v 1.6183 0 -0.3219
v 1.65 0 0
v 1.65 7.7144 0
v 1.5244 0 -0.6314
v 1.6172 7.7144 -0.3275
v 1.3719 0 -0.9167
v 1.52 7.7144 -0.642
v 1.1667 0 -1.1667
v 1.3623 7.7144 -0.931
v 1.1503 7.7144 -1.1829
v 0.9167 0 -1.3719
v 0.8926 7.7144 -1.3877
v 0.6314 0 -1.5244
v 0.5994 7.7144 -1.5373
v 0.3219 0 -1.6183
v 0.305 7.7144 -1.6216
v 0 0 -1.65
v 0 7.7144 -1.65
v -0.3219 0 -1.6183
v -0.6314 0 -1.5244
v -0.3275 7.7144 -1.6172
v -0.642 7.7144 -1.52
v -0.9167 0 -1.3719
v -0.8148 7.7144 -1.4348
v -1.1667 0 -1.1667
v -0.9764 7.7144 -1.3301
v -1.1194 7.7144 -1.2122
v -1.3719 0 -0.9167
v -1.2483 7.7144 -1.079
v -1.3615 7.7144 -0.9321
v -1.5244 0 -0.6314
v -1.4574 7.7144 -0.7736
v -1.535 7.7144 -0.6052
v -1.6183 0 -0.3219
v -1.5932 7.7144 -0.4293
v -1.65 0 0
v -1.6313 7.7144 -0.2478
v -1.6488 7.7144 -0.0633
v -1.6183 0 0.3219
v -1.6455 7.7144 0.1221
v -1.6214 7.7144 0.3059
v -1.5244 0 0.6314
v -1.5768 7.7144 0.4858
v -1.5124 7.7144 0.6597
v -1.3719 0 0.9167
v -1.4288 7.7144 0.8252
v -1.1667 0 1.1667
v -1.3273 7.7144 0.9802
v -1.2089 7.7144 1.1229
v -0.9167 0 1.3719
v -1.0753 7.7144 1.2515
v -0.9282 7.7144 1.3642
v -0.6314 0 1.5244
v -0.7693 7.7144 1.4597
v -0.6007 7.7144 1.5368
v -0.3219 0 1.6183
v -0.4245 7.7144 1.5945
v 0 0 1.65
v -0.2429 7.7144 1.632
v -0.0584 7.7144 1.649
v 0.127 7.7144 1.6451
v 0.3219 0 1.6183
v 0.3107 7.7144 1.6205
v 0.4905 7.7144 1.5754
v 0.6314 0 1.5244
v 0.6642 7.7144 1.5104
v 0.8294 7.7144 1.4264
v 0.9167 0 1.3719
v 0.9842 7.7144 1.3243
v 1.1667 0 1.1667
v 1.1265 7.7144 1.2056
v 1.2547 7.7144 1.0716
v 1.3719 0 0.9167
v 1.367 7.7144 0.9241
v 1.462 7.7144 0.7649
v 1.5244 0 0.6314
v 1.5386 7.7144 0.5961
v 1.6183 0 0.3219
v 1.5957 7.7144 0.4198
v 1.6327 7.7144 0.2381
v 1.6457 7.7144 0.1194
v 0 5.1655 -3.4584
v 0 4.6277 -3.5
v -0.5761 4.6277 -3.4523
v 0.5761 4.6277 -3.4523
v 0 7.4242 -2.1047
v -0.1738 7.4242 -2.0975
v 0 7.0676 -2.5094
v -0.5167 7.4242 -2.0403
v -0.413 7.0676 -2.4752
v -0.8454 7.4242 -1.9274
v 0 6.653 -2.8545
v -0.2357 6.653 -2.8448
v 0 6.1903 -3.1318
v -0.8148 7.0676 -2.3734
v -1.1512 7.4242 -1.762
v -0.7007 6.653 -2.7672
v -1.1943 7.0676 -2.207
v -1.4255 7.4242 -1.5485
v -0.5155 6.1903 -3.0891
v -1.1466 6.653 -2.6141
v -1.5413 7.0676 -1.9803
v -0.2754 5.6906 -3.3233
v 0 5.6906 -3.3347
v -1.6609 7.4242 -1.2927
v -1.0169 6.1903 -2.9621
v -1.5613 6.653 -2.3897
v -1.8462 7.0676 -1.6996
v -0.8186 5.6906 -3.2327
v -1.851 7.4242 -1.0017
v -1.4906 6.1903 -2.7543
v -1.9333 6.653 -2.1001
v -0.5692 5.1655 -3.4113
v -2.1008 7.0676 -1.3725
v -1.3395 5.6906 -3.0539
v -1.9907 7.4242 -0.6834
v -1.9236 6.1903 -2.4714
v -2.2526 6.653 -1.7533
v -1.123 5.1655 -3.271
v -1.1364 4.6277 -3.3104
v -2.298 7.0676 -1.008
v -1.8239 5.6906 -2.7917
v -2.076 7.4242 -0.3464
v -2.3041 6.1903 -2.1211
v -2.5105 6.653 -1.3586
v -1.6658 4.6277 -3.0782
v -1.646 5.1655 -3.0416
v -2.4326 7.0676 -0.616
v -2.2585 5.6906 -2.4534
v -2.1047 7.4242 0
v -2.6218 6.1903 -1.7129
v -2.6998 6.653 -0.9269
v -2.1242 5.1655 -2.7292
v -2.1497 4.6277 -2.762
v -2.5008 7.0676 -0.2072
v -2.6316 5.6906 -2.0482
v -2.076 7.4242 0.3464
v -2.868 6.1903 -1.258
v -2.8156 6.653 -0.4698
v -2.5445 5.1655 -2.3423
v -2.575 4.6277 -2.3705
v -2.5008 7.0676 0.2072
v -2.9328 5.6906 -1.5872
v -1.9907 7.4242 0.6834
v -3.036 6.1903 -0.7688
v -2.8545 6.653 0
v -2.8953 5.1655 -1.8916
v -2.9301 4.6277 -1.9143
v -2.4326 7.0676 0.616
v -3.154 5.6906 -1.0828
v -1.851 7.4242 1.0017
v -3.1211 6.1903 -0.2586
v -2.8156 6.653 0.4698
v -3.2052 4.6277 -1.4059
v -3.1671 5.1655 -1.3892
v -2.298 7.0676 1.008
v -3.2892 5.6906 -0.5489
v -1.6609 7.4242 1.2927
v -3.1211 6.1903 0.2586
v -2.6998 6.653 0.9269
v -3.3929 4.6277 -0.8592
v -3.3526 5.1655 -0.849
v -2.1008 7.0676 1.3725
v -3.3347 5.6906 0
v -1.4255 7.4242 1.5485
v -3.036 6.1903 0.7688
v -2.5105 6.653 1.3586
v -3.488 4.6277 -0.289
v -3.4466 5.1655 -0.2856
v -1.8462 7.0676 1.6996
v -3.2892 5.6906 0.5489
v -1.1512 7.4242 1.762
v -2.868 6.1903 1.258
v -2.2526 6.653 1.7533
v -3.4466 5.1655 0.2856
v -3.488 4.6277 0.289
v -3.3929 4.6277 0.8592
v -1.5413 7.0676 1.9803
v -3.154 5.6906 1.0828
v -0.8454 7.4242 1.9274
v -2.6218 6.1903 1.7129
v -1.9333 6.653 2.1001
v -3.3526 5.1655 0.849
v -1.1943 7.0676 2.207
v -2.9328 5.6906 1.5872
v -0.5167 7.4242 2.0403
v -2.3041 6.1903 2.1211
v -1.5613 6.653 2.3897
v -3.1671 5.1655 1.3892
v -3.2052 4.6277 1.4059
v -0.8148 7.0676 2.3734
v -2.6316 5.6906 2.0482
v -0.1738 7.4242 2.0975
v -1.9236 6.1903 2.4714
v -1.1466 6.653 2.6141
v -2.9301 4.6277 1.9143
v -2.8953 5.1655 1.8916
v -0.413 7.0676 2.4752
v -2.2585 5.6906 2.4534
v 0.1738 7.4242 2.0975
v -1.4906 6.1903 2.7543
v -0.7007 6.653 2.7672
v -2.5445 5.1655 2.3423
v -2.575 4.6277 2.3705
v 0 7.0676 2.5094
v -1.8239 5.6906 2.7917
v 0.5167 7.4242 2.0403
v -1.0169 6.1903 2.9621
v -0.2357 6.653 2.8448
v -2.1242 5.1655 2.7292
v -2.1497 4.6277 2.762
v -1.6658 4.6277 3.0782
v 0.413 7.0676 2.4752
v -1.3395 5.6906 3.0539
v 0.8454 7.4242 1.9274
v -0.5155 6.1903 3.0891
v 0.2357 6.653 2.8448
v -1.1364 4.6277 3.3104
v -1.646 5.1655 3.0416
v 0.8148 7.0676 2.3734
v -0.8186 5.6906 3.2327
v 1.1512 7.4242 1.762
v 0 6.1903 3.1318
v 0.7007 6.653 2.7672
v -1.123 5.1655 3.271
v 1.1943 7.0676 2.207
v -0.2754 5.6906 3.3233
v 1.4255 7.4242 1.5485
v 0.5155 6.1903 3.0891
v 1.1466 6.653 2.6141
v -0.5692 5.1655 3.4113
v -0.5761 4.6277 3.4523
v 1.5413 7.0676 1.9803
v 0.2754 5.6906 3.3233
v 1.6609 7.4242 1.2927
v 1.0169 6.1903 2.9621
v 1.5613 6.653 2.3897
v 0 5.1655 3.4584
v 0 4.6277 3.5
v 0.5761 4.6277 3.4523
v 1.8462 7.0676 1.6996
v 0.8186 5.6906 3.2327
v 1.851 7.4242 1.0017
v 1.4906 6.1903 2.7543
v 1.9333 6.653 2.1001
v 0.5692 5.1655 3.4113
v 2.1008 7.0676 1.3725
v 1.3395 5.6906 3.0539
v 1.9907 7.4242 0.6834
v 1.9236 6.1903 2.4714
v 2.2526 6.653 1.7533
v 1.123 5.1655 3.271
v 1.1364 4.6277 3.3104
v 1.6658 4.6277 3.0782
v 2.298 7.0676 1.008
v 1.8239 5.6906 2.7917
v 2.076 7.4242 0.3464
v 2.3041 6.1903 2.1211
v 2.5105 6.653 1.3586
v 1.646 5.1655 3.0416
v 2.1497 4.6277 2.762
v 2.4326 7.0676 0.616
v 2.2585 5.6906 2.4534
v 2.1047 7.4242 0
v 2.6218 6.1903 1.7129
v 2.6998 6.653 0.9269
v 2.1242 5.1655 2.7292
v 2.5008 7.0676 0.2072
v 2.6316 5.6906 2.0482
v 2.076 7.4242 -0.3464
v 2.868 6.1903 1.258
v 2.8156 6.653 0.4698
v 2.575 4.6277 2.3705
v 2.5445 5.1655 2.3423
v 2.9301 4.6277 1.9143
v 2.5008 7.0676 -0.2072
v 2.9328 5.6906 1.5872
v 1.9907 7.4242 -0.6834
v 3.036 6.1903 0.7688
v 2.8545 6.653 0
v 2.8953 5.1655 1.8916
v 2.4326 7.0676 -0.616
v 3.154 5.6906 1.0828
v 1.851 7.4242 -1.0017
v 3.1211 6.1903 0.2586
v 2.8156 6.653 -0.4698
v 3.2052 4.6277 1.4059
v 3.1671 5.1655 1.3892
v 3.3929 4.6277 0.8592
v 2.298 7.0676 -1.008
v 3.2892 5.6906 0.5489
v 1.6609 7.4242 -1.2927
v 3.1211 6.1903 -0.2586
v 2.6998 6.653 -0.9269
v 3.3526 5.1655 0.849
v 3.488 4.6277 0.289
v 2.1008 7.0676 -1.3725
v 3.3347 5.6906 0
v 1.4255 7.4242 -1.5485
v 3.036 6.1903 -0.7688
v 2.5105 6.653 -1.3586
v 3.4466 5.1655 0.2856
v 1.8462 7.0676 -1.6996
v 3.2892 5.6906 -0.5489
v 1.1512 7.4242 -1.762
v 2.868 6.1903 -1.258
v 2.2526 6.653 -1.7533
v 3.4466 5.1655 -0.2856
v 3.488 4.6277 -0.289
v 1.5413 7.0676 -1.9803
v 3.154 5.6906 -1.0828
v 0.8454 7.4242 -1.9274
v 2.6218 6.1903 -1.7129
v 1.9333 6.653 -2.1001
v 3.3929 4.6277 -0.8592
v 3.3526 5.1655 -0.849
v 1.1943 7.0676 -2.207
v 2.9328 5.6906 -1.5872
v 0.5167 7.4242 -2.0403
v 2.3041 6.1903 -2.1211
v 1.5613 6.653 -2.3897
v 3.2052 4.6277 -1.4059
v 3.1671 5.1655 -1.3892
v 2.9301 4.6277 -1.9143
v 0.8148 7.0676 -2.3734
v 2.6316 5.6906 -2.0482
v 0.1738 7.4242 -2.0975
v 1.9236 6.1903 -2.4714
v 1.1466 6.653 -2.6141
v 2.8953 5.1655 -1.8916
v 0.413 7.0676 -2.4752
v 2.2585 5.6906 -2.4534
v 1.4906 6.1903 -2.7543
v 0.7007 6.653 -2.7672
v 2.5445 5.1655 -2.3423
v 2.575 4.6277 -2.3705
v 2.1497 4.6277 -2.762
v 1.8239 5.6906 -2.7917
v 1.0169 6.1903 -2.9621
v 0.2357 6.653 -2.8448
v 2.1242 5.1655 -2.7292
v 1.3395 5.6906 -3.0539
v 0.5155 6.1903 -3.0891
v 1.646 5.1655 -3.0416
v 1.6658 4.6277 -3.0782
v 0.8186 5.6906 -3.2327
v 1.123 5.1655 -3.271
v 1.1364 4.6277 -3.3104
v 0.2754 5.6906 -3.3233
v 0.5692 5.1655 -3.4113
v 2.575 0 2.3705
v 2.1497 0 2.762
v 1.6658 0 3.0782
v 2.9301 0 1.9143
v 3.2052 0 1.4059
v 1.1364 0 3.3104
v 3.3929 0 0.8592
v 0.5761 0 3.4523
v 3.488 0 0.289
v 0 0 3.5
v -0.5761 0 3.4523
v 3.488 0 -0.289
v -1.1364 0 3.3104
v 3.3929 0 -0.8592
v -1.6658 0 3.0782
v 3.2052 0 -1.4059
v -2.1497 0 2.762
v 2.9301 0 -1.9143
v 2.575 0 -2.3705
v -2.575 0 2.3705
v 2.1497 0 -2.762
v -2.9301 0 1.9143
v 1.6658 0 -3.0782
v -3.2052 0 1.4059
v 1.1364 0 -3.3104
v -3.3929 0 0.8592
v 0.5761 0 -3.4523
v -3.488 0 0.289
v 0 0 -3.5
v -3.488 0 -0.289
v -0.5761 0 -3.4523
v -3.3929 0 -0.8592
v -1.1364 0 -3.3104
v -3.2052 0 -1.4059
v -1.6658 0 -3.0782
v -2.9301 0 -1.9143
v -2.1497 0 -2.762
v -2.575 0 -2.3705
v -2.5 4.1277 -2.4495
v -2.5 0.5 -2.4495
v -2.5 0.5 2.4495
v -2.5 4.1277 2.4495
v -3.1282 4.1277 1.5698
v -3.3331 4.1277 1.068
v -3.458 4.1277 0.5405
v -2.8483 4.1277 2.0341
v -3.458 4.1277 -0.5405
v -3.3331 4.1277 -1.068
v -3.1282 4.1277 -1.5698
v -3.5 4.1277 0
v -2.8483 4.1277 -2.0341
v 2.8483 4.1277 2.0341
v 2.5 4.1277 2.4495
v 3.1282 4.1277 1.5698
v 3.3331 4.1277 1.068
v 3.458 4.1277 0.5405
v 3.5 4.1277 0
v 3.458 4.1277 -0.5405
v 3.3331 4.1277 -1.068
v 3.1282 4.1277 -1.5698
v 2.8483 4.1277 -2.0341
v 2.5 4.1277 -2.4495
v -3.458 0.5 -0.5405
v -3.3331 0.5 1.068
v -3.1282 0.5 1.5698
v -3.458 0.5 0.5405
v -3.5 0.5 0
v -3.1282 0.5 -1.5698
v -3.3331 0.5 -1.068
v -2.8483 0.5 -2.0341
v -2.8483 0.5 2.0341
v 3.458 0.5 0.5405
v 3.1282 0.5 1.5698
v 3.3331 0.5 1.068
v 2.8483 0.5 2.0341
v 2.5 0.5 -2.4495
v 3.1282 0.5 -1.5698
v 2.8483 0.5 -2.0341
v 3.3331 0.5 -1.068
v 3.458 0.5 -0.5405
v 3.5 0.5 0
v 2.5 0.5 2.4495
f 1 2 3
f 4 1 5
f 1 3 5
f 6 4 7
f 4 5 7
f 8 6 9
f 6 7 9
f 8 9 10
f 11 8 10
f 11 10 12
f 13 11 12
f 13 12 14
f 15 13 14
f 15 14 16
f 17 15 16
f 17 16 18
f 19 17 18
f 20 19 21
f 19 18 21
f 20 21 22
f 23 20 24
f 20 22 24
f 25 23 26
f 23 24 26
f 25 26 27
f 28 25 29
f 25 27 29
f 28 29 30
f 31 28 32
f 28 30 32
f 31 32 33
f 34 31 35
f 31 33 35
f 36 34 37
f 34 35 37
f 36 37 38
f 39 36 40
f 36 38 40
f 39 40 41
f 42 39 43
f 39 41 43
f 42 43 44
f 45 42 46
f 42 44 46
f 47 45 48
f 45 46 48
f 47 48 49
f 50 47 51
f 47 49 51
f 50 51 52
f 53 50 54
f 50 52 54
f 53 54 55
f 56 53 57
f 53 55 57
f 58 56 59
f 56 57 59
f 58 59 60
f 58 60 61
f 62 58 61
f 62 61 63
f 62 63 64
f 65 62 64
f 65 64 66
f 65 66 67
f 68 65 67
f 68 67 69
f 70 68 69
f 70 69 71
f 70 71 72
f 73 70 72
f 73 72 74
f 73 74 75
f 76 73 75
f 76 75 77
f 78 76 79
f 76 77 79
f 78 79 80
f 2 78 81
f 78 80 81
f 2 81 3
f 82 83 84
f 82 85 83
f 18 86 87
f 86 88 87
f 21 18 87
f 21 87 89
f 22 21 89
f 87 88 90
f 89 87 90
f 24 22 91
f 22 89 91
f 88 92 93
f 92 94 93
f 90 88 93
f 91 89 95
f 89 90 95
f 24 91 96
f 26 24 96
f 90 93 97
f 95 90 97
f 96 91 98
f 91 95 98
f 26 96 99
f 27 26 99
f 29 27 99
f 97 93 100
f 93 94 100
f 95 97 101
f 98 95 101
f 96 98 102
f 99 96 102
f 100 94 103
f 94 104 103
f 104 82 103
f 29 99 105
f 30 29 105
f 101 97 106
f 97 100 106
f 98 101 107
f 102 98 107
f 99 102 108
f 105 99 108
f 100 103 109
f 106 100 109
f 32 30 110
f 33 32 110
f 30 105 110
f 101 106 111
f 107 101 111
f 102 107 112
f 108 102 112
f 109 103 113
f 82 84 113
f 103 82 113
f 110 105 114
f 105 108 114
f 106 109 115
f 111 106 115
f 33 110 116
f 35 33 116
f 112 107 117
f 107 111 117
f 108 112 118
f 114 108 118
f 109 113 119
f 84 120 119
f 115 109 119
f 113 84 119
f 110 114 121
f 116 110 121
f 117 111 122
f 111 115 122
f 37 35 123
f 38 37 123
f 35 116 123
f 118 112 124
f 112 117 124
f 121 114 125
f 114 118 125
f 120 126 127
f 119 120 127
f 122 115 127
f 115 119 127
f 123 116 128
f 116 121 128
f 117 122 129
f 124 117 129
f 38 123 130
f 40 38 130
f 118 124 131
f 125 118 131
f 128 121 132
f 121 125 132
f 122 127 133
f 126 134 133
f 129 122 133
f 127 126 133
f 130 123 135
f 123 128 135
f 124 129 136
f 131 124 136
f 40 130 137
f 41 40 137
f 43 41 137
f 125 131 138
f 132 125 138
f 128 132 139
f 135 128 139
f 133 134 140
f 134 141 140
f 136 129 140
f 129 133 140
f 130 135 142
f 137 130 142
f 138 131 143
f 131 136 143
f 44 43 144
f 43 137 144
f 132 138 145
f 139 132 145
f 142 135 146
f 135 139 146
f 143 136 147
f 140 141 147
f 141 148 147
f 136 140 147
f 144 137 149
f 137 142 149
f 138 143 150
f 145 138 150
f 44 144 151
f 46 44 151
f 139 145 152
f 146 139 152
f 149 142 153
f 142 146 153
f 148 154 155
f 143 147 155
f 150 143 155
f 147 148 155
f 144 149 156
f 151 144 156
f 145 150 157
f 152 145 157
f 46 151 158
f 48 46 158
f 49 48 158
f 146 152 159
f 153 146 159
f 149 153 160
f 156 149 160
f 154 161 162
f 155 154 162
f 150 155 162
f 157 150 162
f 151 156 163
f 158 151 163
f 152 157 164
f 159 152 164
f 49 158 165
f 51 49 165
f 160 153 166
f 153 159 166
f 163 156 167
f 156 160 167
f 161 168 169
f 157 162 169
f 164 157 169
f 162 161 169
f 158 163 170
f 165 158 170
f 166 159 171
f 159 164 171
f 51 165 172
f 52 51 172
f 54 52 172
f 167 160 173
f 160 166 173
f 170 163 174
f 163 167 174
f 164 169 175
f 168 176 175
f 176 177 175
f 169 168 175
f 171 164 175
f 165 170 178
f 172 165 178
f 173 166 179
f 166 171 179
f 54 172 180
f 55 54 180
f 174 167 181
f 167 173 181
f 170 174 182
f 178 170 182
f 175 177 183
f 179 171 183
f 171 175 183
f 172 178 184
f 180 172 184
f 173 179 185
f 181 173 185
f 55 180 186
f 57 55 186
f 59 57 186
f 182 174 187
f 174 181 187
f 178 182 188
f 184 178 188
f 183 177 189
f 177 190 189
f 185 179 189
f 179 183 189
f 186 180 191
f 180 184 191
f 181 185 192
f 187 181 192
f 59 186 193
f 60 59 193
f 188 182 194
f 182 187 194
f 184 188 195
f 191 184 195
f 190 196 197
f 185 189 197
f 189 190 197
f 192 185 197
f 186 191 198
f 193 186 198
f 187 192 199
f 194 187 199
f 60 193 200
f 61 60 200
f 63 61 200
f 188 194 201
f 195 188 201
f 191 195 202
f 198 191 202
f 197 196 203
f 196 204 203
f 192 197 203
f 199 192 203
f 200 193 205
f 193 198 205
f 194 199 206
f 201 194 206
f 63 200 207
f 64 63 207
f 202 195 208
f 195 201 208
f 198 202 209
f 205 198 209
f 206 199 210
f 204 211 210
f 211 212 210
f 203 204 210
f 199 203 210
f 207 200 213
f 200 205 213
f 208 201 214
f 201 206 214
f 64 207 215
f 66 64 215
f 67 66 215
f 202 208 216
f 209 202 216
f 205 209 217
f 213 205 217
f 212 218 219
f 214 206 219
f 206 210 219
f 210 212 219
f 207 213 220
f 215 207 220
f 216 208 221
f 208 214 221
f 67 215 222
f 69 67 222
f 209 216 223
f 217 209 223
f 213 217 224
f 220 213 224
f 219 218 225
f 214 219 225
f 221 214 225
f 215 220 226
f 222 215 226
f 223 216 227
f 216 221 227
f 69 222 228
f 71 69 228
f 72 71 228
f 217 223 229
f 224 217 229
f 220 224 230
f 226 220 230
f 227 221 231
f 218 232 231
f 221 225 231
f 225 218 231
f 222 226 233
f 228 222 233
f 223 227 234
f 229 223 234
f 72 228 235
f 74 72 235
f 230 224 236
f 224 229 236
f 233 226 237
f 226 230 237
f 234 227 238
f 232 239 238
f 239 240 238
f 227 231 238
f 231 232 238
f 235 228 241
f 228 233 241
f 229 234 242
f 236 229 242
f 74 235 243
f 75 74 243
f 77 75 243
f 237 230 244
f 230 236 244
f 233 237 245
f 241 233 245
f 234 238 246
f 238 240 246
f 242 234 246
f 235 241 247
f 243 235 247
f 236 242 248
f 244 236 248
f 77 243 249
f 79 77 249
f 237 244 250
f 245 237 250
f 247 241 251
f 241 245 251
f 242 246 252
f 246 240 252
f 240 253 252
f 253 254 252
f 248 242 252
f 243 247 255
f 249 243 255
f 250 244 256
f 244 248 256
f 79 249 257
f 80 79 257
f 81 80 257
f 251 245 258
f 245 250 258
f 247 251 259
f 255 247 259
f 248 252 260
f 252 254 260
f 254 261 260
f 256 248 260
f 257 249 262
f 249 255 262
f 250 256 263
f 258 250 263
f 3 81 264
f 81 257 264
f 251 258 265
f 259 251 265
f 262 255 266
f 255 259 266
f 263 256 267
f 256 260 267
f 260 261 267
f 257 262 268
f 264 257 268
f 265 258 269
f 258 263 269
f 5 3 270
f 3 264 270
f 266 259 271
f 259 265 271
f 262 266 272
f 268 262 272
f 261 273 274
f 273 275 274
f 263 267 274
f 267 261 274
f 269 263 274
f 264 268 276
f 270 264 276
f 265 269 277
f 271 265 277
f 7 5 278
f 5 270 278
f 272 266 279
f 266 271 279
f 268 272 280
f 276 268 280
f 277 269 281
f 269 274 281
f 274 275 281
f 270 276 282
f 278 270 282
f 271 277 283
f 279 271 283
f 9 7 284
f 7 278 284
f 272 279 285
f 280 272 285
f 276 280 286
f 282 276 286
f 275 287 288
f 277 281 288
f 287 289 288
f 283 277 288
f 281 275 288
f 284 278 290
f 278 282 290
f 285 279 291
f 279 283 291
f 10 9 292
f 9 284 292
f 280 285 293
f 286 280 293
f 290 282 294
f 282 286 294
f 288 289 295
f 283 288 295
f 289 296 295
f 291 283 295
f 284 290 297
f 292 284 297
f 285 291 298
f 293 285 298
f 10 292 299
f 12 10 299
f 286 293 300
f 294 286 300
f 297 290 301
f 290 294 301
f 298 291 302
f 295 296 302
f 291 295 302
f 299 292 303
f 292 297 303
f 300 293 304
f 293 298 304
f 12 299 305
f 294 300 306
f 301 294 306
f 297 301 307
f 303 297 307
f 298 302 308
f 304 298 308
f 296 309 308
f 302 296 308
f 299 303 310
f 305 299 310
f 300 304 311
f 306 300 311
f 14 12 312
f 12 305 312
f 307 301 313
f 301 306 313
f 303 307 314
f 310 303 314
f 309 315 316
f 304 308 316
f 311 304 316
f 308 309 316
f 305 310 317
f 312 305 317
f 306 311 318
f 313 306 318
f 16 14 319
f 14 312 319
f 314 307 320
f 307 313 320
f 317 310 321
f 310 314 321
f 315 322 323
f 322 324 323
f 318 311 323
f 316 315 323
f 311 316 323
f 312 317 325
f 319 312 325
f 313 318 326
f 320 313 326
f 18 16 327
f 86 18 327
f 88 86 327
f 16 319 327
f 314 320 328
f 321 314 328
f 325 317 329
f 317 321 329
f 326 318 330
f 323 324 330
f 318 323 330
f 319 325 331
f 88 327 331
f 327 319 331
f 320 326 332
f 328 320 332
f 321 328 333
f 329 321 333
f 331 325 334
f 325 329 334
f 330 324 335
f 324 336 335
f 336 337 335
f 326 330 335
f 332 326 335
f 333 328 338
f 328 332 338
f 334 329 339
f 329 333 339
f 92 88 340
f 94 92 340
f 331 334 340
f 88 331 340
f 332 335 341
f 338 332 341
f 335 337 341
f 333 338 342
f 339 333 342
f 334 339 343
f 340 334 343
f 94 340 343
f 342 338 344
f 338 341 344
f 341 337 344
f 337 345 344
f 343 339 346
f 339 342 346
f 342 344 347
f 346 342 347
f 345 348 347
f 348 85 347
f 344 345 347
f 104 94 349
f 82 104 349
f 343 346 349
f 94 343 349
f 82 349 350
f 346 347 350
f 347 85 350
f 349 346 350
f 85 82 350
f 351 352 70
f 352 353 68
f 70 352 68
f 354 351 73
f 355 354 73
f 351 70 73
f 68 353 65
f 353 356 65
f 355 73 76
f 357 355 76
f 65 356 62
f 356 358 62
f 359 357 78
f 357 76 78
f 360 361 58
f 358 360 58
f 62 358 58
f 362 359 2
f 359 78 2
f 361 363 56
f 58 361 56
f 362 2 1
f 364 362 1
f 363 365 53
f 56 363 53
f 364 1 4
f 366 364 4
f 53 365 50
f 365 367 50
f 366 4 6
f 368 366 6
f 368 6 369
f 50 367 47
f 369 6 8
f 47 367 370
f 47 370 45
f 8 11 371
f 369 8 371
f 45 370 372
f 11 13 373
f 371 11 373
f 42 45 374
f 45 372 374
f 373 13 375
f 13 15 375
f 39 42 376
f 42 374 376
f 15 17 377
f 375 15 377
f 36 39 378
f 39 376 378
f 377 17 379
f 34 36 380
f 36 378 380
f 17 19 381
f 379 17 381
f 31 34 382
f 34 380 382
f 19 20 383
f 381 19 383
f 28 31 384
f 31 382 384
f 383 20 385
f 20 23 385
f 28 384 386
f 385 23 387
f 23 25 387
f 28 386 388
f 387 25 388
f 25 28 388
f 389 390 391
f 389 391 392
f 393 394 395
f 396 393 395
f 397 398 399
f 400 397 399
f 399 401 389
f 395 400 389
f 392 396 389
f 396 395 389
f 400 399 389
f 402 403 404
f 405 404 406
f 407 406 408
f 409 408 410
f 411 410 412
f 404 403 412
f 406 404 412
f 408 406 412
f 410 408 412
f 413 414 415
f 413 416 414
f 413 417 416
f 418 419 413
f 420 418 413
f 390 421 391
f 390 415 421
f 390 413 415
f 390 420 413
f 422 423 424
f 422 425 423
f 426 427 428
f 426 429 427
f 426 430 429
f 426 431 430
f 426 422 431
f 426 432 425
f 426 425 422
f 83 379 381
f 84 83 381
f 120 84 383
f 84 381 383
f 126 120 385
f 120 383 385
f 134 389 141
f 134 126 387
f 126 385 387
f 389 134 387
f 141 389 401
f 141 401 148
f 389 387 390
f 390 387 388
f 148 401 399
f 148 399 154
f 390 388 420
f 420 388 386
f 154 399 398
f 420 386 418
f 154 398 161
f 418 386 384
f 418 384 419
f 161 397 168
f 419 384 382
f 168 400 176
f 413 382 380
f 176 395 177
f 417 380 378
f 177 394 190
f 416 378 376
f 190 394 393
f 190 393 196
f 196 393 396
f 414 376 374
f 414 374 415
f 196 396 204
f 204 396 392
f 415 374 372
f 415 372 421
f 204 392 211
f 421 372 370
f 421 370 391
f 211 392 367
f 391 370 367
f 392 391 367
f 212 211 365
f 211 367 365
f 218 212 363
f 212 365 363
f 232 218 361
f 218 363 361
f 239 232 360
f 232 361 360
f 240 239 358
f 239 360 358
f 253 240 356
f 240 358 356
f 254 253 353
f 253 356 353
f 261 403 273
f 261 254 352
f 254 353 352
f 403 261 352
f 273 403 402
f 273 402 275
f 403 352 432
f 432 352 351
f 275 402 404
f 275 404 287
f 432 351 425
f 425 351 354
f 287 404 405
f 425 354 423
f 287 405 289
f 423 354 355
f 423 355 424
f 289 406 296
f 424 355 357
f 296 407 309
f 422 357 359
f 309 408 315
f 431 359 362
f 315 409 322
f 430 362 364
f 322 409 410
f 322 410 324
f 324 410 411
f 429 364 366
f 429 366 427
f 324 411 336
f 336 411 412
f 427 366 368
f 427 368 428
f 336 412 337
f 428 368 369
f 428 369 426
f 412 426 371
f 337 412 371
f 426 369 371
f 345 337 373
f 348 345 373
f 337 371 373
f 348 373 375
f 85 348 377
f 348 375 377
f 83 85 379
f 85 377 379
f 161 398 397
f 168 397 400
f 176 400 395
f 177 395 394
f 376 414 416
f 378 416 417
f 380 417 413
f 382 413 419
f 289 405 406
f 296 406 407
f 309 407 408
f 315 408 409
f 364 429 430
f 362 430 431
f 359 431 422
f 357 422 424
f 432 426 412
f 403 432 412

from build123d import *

# Parameters (mm, degrees)
TAP_DRILL_FOR_M4X0_7_TAP1_D = 3.3
CUT_EXTRUDE1_DEPTH          = 10.165790389
CUT_EXTRUDE1_DEPTH_BACK     = 10.165790389
SKETCH5_W                   = 1
SKETCH5_H                   = 3.627718677


with BuildPart() as part:
    # Sketch1 → Revolve1 (revolve)
    with BuildSketch(Plane.XY, mode=Mode.PRIVATE) as revolve1_sk:
        with BuildLine():
            Line((0, 0), (0, 8.127718677))
            ThreePointArc((0, 8.127718677), (2.474873734, 7.102592411), (3.5, 4.627718677))
            Line((3.5, 4.627718677), (3.5, 0))
            Line((3.5, 0), (0, 0))
        make_face()
    revolve(revolve1_sk.sketch.rotate(Axis((0, 8.127718677, 0), (0, 1, 0)), 90), axis=Axis((0, 8.127718677, 0), (0, 1, 0)))

    # Tap Drill for M4x0.7 Tap1 (through all)
    with Locations(Plane(origin=(0, 0, 0), x_dir=(-1, 0, 0), z_dir=(0, -1, 0))):
        with Locations((0, 0)):
            Hole(TAP_DRILL_FOR_M4X0_7_TAP1_D / 2)

    # Sketch5 → Cut-Extrude1 (cut, two sides: drawn at the far end of the back side and taken through both)
    with BuildSketch(Plane.XY.offset(-CUT_EXTRUDE1_DEPTH_BACK)):
        with Locations((3, 2.313859338)):
            Rectangle(SKETCH5_W, SKETCH5_H)
        with Locations((-3, 2.313859338)):
            Rectangle(SKETCH5_W, SKETCH5_H)
    extrude(amount=CUT_EXTRUDE1_DEPTH + CUT_EXTRUDE1_DEPTH_BACK, mode=Mode.SUBTRACT)


solid = part.part
